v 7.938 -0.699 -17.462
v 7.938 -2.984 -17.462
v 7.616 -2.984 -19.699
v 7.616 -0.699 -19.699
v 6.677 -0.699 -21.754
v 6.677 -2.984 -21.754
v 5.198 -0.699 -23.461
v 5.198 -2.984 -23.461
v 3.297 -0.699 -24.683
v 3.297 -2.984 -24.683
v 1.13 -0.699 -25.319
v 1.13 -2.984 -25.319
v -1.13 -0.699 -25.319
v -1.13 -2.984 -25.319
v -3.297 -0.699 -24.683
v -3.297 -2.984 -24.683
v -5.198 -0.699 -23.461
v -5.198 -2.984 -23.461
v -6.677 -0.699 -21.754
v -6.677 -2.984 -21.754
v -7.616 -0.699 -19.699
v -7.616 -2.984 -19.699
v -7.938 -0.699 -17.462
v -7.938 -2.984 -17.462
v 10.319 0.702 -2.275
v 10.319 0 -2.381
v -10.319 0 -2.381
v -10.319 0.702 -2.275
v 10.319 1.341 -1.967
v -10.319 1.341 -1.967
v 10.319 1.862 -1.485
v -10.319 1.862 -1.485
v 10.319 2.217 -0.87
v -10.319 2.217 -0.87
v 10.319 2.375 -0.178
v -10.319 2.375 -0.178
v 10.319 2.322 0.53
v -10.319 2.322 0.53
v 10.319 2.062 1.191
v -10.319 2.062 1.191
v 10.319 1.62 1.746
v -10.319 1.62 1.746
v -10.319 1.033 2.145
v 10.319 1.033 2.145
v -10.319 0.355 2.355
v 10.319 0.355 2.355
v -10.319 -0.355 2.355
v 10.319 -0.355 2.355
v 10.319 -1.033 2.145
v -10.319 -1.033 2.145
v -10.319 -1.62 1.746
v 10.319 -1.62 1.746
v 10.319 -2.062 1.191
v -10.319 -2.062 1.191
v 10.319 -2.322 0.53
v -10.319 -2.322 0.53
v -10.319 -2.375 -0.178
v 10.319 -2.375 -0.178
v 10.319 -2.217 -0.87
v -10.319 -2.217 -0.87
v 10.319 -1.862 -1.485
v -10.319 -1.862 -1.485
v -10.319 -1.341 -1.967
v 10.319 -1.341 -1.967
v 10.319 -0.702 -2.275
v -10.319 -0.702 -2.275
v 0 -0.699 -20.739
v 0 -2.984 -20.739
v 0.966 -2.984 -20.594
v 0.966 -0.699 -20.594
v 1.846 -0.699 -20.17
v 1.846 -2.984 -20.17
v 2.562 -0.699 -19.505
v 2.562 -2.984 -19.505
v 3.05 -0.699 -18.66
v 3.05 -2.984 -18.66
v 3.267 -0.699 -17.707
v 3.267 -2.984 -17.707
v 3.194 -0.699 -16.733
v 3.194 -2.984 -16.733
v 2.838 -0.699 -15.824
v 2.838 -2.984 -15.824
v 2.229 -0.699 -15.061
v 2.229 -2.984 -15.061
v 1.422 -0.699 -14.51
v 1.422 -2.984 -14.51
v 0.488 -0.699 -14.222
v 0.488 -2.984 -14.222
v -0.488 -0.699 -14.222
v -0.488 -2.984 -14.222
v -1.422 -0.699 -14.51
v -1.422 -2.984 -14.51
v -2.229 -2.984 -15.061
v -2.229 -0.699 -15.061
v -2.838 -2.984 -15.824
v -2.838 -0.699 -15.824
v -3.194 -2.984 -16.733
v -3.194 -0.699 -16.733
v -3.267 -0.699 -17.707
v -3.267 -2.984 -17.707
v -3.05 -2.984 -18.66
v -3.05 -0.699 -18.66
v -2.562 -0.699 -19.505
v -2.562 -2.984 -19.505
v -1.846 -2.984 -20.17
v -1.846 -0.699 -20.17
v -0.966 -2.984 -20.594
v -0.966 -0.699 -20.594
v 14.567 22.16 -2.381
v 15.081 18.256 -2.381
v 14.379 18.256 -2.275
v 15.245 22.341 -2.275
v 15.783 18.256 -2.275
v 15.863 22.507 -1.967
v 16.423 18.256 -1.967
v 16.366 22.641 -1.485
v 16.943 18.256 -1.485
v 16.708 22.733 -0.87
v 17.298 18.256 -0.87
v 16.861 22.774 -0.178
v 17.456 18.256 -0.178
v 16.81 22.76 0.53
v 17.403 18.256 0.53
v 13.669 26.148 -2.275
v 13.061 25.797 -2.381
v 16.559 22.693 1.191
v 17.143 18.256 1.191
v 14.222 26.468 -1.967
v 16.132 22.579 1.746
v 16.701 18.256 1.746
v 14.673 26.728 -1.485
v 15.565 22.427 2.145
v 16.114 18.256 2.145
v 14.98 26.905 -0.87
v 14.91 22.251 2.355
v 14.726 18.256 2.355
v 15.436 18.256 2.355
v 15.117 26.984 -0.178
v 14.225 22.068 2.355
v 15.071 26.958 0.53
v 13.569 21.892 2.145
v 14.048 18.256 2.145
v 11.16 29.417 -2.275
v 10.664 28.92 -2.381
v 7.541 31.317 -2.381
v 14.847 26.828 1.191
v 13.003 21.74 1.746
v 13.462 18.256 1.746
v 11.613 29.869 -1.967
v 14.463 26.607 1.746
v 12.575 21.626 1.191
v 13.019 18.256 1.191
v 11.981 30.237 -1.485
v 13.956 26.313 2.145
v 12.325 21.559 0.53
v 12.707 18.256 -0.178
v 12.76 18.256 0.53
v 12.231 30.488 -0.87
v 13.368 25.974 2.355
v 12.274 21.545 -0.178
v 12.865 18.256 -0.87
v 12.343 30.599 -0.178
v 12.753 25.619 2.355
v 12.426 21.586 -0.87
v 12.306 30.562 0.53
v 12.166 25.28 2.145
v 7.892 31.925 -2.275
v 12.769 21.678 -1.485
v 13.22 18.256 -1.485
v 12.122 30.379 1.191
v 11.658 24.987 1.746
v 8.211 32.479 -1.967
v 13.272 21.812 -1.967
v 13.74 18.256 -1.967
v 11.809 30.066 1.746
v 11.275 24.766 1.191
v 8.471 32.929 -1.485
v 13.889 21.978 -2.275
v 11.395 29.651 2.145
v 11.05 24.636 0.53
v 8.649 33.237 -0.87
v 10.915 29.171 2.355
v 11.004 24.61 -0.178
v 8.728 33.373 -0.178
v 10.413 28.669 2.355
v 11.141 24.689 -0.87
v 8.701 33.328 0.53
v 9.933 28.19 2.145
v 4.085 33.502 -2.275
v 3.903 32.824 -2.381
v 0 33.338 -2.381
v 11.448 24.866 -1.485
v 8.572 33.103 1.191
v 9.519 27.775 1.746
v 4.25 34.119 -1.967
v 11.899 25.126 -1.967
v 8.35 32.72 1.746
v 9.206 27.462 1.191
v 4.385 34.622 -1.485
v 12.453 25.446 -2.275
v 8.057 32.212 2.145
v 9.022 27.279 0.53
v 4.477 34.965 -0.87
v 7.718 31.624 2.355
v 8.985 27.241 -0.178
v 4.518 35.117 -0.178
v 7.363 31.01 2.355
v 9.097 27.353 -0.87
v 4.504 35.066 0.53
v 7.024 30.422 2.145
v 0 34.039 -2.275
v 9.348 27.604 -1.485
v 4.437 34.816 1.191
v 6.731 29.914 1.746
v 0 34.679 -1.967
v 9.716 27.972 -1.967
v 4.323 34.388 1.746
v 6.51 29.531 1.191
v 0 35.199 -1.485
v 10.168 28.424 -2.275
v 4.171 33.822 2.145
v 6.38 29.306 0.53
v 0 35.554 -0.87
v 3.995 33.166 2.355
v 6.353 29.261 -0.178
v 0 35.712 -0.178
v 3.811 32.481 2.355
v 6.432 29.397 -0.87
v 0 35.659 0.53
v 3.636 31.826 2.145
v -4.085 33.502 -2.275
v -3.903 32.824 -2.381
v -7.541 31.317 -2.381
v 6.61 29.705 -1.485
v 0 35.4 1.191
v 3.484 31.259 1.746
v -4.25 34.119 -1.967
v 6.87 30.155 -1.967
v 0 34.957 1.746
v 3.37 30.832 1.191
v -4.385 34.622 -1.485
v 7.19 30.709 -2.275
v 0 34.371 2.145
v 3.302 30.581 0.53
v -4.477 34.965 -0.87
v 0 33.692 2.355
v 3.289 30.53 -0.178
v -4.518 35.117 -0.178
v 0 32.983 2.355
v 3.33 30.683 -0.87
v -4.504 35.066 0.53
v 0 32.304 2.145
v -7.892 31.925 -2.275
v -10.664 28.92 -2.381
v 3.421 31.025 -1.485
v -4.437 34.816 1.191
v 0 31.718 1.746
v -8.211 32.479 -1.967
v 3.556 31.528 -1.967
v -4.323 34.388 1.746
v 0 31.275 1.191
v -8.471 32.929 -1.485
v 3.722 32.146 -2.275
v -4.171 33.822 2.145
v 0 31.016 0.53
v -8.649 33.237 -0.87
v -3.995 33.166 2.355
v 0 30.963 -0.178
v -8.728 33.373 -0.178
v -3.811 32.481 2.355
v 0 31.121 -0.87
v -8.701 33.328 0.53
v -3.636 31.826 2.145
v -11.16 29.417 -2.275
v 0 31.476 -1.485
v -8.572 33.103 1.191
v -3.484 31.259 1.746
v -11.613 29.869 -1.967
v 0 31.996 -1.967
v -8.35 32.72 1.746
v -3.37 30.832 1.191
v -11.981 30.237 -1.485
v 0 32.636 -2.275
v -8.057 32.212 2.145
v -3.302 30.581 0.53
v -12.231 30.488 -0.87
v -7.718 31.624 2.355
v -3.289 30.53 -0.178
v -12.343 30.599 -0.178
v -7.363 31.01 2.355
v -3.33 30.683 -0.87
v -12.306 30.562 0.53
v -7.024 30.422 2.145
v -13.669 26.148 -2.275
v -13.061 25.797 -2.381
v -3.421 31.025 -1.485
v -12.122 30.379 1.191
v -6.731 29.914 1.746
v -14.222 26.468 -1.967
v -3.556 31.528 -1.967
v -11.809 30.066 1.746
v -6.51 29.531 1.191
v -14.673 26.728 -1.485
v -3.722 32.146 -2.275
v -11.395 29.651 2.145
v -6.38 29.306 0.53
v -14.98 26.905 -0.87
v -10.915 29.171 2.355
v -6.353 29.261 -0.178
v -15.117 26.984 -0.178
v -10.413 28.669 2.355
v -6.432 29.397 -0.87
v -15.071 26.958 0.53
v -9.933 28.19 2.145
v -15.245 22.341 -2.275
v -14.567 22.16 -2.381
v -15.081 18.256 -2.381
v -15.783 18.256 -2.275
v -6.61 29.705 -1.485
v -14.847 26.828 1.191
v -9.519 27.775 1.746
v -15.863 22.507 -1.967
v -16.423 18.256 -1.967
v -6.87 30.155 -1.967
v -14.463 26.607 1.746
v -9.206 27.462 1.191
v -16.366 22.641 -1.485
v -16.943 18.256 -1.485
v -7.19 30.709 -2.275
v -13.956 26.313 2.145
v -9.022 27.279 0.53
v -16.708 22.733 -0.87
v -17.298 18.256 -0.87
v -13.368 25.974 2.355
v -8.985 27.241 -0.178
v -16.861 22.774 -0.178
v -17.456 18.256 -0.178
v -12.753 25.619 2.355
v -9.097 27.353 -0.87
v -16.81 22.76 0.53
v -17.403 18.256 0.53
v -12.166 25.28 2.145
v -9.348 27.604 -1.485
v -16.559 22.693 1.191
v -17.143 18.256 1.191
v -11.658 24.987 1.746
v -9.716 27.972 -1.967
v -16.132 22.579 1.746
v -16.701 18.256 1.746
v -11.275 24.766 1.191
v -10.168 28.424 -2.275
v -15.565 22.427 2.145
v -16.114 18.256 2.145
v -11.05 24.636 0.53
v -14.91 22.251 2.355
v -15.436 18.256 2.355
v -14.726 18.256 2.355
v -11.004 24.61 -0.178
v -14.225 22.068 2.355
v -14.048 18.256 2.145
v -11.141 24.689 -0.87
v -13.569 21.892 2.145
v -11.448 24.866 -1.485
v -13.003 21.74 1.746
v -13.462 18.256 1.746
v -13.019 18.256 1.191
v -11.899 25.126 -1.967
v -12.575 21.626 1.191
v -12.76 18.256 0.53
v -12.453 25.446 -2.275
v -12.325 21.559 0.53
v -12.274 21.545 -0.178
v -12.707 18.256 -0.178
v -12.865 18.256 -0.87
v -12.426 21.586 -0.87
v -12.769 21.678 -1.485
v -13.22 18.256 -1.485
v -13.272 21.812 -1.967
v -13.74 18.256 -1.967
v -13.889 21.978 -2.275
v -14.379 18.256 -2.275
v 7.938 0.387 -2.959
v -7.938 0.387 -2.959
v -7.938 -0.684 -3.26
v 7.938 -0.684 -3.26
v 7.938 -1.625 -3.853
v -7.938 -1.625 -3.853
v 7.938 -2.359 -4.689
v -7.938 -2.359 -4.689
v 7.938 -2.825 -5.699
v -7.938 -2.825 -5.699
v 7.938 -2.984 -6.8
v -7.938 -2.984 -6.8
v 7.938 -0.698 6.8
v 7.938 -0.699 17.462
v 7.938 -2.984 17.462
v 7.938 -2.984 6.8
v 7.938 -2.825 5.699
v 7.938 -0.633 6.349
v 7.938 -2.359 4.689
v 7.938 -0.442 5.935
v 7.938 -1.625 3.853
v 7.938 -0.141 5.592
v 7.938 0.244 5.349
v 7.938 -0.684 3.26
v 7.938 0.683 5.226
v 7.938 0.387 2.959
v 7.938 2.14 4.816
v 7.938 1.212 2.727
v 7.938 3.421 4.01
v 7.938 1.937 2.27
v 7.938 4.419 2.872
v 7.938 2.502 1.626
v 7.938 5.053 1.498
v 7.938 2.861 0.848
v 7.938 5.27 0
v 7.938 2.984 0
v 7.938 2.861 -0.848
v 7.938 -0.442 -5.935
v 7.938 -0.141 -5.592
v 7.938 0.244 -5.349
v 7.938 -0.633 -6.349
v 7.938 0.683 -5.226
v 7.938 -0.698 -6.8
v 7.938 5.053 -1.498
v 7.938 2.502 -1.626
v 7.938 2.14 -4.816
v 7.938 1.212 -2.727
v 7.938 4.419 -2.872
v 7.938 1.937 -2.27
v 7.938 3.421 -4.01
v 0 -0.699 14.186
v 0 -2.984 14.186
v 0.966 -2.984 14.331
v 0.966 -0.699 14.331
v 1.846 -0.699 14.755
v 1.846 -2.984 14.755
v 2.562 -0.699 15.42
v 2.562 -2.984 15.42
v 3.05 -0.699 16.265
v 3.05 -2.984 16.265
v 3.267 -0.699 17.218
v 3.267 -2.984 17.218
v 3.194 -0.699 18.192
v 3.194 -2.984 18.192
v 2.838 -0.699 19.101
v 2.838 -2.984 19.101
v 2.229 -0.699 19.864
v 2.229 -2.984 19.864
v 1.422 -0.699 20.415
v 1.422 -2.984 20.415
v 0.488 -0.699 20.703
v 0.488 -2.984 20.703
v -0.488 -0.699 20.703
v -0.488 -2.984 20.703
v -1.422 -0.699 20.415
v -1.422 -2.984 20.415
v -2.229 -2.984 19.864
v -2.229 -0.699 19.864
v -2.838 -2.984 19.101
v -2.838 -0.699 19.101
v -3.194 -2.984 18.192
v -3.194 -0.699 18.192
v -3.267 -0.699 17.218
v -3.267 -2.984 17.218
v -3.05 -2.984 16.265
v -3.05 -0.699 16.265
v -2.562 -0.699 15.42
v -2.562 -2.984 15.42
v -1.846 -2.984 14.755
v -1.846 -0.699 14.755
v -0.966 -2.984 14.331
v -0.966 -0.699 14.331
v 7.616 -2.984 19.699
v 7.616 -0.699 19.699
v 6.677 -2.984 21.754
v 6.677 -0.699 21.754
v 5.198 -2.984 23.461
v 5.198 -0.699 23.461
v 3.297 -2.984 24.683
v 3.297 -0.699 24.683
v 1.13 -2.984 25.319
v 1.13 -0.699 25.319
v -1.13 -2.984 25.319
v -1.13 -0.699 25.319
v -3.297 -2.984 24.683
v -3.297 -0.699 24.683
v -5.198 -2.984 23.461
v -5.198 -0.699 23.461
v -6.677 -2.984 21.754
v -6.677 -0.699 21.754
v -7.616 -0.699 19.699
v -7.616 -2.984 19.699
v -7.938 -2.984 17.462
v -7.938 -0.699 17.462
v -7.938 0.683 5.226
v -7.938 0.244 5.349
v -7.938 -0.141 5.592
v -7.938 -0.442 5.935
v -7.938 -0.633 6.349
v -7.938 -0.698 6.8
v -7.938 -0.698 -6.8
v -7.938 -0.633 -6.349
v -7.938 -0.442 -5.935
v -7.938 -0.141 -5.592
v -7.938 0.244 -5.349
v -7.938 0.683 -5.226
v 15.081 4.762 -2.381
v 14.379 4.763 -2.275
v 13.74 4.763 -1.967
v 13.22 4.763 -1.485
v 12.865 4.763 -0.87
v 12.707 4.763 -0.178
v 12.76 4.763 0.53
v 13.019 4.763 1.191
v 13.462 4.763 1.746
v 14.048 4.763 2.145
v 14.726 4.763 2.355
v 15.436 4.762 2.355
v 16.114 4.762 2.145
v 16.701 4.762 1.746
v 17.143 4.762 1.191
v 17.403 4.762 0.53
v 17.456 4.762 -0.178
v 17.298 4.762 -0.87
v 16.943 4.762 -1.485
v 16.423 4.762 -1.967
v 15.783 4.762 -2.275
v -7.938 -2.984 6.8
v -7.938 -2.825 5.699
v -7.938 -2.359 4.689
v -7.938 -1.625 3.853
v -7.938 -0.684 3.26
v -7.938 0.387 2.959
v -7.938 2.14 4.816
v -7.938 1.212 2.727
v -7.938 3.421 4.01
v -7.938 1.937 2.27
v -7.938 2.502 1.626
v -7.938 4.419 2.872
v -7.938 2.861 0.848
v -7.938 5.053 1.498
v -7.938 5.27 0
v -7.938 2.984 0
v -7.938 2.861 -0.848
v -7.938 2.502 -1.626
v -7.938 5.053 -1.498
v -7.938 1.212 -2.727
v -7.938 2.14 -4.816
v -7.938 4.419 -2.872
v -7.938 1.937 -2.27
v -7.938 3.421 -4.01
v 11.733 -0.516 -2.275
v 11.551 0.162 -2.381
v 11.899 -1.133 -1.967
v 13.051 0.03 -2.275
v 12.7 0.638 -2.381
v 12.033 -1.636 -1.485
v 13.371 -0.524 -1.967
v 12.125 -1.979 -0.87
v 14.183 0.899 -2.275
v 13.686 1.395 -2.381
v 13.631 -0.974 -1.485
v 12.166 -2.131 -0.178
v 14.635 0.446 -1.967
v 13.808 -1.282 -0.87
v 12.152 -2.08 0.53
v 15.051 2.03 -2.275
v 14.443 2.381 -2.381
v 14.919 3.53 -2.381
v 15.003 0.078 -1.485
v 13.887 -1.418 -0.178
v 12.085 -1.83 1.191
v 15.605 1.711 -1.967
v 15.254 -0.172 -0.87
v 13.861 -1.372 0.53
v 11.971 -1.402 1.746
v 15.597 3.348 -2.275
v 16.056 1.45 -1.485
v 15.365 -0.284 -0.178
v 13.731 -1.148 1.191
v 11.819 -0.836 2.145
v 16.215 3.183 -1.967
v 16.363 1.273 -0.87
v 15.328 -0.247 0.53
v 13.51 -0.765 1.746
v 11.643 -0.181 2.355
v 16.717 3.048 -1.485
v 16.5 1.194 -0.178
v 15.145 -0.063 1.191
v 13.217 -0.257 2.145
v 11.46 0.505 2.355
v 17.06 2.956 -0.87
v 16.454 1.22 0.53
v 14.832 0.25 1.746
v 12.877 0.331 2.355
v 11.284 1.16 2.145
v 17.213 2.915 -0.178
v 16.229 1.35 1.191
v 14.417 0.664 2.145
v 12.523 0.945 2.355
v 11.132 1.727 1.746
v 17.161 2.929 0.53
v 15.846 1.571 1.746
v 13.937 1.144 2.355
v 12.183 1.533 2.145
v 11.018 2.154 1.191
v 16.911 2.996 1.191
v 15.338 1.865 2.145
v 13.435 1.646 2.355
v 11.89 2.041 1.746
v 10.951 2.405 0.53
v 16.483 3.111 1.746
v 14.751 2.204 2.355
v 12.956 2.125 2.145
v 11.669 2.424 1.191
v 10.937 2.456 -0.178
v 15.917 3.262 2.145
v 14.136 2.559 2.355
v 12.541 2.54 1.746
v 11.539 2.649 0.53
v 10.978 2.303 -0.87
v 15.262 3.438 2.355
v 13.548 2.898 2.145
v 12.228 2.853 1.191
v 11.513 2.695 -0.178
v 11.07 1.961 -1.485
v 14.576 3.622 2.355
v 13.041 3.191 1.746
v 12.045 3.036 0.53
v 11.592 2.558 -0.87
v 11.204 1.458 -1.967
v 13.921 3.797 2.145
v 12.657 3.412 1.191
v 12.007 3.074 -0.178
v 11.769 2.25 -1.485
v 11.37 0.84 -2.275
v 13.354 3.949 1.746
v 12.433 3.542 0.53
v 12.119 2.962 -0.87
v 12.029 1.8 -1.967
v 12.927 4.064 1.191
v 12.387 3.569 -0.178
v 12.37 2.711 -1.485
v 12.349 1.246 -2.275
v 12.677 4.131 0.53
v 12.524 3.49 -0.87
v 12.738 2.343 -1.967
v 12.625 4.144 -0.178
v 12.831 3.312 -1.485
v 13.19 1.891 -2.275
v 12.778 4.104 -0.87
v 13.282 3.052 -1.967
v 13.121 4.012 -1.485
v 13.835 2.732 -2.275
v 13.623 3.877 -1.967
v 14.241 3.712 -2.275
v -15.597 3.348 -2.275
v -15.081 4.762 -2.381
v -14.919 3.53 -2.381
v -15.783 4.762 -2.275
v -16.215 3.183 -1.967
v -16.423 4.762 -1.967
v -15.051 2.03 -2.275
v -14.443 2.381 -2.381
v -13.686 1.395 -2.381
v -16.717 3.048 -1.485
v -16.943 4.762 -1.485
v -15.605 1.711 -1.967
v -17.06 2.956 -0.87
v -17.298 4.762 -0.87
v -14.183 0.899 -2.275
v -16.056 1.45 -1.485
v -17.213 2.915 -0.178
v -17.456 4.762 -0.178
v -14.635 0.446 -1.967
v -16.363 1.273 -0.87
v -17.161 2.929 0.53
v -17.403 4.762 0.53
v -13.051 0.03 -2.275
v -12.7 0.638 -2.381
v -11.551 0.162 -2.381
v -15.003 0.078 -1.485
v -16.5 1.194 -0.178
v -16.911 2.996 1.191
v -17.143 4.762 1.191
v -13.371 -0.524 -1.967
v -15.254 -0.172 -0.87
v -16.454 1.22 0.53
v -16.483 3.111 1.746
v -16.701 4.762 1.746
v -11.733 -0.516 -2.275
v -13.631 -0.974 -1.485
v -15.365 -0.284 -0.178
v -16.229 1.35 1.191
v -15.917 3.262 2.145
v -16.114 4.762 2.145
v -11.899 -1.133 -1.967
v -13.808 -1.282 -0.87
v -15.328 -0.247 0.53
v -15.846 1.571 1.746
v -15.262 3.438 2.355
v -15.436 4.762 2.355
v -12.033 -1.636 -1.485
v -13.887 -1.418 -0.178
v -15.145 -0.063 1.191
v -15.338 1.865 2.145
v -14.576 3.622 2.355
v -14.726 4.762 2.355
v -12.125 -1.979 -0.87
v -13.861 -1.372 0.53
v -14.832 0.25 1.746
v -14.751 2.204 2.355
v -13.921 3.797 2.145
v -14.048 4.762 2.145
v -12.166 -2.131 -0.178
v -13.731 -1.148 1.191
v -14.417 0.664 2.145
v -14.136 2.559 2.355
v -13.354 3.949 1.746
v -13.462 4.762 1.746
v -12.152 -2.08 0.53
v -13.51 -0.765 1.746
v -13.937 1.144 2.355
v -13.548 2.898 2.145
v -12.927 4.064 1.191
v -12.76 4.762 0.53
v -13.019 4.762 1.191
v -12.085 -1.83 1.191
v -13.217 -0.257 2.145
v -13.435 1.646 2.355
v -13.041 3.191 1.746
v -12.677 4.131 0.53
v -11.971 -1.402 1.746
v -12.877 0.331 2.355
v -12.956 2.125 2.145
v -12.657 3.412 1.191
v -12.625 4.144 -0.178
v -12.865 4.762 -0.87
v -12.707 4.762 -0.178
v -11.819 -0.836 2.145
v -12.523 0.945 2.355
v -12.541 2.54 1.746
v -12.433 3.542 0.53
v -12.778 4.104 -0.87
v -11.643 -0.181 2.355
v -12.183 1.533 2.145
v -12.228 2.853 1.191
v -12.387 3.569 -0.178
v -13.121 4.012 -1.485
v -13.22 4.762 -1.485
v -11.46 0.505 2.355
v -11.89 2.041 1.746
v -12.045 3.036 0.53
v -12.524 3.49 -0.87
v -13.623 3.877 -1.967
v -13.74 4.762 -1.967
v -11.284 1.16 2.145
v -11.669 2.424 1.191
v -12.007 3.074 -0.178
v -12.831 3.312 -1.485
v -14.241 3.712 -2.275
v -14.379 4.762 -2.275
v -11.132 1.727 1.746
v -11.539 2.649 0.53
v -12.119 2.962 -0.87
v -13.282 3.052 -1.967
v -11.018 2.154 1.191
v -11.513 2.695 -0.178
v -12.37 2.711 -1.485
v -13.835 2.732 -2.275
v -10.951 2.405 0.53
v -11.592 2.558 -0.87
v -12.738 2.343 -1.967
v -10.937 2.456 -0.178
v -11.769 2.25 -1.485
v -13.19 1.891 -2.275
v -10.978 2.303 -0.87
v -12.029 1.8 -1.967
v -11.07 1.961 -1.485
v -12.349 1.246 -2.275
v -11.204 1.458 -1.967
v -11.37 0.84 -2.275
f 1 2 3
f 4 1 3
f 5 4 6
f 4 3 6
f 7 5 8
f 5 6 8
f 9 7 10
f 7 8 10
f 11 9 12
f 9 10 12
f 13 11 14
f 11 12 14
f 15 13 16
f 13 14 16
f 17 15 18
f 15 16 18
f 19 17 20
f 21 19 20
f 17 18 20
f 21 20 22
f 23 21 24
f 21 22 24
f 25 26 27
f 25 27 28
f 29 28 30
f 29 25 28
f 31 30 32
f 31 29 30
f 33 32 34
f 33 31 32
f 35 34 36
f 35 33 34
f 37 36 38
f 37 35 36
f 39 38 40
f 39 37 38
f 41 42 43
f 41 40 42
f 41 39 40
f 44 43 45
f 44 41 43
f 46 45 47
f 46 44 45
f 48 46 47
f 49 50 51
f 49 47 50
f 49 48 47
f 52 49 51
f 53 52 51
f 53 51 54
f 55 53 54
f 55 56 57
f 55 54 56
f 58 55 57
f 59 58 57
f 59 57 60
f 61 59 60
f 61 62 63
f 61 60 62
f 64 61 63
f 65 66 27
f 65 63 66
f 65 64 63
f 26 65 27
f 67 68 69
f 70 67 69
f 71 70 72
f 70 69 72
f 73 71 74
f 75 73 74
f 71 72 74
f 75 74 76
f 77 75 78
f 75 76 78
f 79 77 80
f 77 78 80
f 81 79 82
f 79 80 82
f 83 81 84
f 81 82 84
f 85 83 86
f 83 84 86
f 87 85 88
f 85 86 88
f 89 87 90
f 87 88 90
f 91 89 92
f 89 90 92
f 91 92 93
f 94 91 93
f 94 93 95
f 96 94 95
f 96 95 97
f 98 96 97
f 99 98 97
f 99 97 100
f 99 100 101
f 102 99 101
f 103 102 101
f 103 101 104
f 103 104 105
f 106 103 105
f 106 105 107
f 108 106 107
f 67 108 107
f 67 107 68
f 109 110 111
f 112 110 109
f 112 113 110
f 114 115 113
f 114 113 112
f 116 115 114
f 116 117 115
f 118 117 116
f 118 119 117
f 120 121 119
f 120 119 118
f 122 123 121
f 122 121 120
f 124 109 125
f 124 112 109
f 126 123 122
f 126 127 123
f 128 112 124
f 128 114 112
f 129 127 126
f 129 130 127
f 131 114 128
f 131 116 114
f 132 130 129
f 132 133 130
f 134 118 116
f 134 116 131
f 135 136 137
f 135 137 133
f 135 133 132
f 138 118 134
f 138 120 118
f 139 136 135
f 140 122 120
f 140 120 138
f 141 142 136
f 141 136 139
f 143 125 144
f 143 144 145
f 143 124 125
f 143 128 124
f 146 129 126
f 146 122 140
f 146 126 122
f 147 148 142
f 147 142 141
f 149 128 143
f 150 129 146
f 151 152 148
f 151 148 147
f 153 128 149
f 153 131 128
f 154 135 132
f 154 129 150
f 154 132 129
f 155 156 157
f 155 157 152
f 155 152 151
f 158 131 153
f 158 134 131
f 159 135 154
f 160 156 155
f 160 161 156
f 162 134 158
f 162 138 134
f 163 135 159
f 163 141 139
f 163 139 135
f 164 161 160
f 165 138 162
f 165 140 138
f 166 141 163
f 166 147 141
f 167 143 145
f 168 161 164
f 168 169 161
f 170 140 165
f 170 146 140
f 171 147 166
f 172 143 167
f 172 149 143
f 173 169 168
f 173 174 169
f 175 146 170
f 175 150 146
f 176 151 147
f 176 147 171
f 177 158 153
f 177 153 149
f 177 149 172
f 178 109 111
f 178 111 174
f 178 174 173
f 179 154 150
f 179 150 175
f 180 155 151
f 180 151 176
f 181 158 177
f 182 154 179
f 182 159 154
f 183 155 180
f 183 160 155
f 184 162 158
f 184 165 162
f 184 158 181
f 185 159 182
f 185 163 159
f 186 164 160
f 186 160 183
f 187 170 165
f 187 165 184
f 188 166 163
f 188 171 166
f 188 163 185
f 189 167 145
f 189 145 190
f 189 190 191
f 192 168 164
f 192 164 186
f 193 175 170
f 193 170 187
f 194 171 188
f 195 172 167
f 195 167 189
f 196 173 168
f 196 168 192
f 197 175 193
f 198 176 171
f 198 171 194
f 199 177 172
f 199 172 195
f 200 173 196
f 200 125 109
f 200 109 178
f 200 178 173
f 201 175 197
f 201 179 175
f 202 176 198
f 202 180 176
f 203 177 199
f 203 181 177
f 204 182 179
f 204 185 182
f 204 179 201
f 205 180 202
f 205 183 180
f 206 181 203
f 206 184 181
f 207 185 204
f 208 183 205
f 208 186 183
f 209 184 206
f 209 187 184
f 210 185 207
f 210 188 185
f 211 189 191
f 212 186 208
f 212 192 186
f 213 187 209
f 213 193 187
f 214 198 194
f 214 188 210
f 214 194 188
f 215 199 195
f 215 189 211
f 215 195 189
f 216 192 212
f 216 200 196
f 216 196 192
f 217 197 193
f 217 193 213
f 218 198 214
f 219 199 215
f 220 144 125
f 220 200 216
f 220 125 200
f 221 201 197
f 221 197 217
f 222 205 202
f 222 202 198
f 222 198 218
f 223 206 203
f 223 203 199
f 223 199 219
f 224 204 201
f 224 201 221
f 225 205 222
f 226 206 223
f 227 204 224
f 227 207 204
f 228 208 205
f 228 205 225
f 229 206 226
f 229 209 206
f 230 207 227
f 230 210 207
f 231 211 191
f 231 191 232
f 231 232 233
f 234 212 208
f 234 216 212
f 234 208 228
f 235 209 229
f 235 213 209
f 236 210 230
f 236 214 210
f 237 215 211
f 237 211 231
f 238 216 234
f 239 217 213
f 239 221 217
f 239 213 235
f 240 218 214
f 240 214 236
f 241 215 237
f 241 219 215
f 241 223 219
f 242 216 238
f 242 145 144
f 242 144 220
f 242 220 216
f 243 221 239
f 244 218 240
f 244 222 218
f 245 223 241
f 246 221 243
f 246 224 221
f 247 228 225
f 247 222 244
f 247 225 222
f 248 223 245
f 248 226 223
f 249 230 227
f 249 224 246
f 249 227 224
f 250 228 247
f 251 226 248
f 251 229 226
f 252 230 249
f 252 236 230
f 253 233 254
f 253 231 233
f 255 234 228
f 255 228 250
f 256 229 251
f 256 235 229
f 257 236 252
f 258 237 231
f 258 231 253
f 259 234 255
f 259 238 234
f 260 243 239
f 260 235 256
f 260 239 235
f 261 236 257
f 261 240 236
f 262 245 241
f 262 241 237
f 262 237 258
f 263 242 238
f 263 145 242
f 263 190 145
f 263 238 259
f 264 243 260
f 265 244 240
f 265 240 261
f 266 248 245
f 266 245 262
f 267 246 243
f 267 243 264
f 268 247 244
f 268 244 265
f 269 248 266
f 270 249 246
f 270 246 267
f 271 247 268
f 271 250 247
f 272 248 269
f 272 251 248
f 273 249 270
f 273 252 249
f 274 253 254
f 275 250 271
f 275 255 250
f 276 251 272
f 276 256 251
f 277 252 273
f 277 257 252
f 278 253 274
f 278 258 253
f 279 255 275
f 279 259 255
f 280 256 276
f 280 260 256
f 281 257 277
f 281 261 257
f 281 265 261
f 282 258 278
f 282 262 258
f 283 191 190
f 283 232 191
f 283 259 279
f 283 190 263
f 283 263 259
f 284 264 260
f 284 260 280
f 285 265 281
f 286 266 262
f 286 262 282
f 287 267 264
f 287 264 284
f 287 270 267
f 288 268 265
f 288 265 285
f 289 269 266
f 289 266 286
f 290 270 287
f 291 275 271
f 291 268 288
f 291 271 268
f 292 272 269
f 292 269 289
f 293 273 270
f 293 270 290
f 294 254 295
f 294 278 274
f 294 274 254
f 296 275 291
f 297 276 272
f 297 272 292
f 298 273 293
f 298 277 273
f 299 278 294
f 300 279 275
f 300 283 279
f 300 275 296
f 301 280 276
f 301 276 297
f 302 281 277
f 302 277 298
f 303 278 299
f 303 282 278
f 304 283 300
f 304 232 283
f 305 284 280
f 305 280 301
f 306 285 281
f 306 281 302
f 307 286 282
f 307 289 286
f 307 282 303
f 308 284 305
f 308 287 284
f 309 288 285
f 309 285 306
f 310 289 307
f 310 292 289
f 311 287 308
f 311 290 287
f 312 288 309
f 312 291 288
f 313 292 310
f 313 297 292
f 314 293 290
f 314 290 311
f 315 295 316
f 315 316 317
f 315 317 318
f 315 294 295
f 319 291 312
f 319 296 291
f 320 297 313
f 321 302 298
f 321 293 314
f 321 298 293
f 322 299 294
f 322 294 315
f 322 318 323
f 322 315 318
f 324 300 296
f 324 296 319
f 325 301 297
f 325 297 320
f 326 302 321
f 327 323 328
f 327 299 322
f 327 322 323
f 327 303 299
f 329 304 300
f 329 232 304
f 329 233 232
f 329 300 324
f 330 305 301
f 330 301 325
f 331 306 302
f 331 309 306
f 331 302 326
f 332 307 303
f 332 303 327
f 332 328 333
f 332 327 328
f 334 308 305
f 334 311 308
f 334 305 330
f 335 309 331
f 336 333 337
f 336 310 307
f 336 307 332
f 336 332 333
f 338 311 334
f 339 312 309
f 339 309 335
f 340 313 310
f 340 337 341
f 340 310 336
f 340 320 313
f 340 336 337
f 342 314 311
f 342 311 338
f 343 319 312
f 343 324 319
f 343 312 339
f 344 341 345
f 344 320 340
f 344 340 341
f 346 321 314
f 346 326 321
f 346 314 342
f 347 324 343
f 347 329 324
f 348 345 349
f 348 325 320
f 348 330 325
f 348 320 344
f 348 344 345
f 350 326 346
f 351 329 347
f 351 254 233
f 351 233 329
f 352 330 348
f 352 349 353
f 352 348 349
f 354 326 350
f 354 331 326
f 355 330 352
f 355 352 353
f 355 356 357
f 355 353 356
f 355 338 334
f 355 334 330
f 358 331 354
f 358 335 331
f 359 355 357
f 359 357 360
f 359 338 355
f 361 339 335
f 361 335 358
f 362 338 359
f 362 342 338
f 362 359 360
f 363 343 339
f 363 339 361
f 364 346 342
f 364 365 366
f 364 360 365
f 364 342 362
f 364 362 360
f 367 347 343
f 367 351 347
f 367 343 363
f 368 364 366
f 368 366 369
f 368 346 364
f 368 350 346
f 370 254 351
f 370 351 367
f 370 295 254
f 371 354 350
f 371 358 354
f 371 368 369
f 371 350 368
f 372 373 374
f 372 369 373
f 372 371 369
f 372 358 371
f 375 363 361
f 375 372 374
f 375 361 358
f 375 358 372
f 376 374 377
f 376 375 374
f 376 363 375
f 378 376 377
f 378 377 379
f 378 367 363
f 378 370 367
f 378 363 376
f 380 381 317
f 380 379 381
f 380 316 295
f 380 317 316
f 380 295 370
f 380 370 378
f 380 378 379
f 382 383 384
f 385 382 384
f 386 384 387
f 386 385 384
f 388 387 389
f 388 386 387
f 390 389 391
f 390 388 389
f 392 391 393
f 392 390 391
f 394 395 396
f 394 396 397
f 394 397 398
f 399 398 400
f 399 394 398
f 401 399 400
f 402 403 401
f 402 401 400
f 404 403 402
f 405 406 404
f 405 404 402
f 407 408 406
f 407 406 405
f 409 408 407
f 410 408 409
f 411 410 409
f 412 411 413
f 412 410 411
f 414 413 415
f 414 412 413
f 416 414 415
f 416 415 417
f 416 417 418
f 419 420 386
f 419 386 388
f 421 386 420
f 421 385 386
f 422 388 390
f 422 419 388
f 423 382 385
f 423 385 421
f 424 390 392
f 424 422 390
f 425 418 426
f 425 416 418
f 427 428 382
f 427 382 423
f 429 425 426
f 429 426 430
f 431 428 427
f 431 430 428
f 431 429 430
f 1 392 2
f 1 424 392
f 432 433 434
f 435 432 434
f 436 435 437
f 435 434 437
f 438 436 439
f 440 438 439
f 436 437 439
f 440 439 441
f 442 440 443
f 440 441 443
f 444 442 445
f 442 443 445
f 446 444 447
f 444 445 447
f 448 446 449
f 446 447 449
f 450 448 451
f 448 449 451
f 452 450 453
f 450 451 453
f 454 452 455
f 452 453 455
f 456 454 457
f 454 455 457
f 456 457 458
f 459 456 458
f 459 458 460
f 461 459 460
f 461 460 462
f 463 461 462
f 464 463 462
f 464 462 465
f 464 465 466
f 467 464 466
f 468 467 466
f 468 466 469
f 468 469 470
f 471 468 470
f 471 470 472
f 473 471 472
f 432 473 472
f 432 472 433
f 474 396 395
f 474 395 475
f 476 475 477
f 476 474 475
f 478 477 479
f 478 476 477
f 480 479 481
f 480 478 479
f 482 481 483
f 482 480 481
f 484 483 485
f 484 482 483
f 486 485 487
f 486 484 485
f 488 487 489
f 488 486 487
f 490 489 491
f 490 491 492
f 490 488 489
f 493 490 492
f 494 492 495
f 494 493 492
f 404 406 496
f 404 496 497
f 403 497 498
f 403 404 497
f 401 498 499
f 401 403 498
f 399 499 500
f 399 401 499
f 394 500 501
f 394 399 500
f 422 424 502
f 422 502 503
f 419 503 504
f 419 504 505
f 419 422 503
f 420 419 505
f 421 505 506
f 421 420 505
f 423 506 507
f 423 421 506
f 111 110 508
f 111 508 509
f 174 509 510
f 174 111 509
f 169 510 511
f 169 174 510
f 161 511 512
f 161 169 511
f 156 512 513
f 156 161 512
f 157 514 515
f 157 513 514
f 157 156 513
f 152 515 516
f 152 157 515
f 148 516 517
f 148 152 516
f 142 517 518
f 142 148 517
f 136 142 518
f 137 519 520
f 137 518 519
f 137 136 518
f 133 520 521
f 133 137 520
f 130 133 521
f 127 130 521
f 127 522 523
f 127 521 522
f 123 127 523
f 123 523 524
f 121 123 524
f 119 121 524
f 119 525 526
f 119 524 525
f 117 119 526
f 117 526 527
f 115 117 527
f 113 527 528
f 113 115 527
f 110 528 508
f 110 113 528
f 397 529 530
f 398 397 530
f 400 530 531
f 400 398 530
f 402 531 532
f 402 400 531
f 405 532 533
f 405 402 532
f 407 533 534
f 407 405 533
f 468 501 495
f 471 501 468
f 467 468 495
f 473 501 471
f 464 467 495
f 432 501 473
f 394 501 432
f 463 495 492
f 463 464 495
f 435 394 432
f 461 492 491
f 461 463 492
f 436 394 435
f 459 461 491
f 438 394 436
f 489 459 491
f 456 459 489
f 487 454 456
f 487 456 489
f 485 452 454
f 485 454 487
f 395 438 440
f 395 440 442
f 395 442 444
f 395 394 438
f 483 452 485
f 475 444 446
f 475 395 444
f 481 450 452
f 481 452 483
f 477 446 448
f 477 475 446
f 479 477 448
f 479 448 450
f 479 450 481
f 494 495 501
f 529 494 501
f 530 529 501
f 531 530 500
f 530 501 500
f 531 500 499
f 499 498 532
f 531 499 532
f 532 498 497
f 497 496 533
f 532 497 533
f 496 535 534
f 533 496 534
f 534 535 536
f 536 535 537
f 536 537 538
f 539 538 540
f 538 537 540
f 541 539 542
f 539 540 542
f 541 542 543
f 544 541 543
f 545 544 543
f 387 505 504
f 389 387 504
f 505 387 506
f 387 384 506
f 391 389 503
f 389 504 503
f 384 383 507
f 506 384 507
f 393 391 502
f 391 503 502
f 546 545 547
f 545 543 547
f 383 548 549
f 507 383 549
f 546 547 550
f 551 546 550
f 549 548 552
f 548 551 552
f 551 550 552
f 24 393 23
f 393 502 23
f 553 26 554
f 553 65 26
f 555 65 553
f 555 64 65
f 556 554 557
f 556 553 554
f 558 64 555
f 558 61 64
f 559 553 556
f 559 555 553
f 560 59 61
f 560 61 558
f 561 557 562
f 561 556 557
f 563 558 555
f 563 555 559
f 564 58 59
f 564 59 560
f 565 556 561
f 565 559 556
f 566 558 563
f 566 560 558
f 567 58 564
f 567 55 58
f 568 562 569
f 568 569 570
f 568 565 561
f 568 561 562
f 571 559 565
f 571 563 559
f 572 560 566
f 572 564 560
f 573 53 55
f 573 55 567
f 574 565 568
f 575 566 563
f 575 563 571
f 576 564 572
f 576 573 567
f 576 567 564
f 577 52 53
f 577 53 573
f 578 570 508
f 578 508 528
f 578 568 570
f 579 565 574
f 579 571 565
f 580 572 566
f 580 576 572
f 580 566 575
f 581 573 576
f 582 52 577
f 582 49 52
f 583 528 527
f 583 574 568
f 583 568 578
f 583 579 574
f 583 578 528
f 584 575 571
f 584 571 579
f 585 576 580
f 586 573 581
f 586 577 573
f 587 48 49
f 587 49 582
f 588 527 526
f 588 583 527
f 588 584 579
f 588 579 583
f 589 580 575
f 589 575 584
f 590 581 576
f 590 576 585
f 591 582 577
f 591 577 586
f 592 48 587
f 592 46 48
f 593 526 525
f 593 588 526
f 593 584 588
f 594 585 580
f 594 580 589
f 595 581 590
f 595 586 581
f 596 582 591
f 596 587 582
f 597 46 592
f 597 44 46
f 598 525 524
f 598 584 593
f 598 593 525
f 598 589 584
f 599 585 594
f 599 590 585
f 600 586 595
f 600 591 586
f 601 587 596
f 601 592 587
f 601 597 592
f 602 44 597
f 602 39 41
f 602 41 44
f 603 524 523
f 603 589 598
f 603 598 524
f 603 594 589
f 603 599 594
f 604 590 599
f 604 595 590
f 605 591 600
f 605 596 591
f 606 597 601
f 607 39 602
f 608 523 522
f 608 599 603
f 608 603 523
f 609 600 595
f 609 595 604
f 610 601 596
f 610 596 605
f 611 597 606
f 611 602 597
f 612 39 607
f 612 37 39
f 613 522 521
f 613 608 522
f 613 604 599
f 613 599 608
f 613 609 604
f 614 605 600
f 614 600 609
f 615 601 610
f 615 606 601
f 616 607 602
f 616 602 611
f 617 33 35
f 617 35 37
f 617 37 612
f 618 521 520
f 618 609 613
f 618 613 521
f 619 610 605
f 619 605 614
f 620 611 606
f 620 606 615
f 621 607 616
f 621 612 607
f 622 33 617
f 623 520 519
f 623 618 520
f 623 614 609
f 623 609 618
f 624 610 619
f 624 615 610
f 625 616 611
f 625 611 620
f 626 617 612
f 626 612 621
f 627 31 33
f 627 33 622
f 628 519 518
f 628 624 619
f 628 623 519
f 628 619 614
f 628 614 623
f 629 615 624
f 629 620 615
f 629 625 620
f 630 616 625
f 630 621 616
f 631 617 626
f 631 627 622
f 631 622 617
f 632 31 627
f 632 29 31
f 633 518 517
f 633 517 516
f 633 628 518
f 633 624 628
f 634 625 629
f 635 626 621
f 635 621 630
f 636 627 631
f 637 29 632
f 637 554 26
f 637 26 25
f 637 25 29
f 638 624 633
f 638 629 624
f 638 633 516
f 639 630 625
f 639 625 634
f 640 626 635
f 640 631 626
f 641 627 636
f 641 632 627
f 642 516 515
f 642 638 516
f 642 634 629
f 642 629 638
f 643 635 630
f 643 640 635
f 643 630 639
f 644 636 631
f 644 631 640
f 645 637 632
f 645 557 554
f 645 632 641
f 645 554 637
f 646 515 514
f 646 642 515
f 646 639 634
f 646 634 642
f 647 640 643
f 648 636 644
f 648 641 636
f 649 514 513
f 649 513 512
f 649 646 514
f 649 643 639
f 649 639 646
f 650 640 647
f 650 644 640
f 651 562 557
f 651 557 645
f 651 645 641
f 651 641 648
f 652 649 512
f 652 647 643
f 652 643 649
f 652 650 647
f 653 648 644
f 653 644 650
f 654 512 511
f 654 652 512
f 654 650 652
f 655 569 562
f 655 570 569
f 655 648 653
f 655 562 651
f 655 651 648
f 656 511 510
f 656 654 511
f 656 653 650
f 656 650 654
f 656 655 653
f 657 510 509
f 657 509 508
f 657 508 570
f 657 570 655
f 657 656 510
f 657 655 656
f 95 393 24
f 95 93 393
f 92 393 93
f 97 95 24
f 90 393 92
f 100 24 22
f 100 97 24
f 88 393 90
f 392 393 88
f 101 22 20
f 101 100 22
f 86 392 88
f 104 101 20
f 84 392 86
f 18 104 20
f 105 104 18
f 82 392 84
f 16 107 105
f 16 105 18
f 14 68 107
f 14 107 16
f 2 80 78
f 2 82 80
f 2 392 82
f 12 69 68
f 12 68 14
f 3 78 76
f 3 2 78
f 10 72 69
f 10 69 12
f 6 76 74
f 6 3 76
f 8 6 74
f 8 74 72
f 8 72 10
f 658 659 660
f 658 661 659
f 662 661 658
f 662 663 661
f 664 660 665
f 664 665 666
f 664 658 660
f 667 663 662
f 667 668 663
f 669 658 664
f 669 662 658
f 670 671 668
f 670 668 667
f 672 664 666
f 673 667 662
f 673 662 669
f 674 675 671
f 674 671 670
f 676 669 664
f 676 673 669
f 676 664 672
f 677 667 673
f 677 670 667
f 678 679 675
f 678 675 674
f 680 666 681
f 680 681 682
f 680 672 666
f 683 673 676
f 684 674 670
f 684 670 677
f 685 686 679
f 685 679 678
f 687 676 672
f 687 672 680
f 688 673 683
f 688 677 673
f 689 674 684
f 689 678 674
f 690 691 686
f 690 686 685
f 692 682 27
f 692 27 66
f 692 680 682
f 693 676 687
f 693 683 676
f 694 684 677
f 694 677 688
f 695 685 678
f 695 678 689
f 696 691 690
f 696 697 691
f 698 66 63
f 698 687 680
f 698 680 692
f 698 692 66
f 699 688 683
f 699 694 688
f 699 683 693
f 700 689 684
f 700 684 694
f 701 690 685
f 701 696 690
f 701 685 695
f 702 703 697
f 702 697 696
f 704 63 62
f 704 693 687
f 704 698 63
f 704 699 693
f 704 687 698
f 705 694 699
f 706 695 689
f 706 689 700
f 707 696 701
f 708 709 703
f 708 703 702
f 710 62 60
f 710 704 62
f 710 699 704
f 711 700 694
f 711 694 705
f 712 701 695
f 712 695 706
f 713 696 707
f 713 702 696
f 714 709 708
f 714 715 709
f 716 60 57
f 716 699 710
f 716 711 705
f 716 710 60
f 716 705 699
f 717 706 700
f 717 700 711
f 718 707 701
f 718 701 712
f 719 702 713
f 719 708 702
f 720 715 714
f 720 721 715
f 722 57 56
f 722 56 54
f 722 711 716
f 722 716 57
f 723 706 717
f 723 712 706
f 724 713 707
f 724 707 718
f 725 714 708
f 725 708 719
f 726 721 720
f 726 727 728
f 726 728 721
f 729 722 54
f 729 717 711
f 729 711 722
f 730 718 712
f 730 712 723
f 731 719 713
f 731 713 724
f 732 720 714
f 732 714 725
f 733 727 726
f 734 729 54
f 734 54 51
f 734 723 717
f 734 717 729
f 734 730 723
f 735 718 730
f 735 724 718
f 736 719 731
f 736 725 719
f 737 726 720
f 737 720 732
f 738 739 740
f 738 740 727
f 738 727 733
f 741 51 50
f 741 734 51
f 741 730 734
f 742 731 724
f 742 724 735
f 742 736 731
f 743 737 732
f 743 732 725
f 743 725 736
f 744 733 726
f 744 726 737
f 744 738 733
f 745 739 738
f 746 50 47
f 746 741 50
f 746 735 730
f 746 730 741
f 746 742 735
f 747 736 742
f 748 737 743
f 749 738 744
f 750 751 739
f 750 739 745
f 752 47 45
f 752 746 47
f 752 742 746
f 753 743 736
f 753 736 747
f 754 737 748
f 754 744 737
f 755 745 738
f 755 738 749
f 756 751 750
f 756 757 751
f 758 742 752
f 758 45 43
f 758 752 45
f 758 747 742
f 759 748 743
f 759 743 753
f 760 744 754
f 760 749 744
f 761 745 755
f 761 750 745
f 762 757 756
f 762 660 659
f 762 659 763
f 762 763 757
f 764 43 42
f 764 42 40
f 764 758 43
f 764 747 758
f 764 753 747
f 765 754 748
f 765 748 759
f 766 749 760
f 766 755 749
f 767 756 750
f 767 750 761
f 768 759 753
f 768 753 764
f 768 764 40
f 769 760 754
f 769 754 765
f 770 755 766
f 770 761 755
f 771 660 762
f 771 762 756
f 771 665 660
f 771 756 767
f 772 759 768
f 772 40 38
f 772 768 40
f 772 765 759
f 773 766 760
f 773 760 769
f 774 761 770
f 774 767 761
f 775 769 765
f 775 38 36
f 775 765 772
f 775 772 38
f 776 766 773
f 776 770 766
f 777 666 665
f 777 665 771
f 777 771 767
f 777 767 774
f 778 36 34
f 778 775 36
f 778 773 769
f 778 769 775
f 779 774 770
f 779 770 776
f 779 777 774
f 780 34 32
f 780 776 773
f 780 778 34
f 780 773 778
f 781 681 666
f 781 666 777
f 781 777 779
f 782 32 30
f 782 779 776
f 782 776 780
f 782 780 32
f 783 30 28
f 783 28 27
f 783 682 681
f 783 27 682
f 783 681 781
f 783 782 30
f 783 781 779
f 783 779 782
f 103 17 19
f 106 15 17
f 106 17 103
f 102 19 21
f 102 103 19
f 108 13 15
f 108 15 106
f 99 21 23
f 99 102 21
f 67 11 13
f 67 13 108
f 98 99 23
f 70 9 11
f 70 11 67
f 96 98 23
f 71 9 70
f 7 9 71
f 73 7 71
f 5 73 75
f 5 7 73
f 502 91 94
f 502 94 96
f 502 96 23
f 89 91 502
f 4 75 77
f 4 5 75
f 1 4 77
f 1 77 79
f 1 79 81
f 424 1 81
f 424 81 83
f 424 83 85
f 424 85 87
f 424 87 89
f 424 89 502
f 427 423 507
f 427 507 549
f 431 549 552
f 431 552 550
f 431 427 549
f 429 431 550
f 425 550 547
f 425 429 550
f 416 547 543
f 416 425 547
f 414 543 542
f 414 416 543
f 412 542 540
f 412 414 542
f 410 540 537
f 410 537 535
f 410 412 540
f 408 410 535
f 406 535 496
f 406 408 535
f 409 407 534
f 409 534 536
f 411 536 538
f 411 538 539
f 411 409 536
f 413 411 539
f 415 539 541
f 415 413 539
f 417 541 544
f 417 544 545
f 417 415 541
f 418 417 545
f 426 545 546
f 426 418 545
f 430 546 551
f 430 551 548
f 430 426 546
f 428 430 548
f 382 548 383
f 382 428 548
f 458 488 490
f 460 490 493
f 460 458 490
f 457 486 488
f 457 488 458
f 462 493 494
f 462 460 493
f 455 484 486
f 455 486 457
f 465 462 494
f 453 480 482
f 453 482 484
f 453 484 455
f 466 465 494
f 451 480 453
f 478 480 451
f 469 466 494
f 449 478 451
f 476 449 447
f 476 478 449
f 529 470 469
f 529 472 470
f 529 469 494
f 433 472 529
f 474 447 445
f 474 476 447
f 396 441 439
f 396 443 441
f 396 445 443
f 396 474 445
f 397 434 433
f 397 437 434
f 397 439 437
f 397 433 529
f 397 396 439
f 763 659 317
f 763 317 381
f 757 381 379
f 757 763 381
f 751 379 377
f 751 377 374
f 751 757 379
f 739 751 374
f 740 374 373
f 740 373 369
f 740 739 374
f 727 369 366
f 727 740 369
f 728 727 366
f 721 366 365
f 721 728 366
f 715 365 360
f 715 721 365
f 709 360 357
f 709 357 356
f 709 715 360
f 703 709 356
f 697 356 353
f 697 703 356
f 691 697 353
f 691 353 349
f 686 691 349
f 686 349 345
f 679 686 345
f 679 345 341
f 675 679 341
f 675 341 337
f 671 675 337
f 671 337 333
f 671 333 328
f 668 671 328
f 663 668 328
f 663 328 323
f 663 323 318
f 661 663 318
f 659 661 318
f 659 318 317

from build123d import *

# Parameters (mm, degrees)
SKETCH2_R           = 2.38125
BOSS_EXTRUDE1_DEPTH = 7.9375
SKETCH4_R           = 3.2766
CUT_EXTRUDE1_DEPTH  = 50.477676563


with BuildPart() as part:
    # Sweep1: sweep along a path in Sketch1
    with BuildLine(Plane.XY) as sweep1_path:
        Line((-15.08125, 18.25625), (-15.08125, 4.7625))
        ThreePointArc((-15.08125, 4.7625), (-13.686346045, 1.394903955), (-10.31875, 0))
        Line((-10.31875, 0), (10.31875, 0))
        ThreePointArc((10.31875, 0), (13.686346045, 1.394903955), (15.08125, 4.7625))
        Line((15.08125, 4.7625), (15.08125, 18.25625))
        ThreePointArc((15.08125, 18.25625), (0, 33.3375), (-15.08125, 18.25625))
    # Sketch2 → Sweep1 (sweep)
    with BuildSketch(Plane(origin=(0, 0, 0), x_dir=(0, 0, -1), z_dir=(1, 0, 0))):
        Circle(SKETCH2_R)
    sweep(path=sweep1_path.line)


with BuildPart() as body_2:
    # Sketch3 → Boss-Extrude1 (new, symmetric)
    with BuildSketch(Plane(origin=(0, 0, 0), x_dir=(0, 0, -1), z_dir=(1, 0, 0))):
        with BuildLine():
            Line((-25.4, -2.9845), (-6.800135513, -2.9845))
            ThreePointArc((-6.800135513, -2.9845), (-4.244843065, -2.022096486), (-2.959318233, 0.38687963))
            ThreePointArc((-2.959318233, 0.38687963), (0, 2.9845), (2.959318233, 0.38687963))
            ThreePointArc((2.959318233, 0.38687963), (4.244843065, -2.022096486), (6.800135513, -2.9845))
            Line((6.800135513, -2.9845), (25.4, -2.9845))
            Line((25.4, -2.9845), (25.4, -0.6985))
            Line((25.4, -0.6985), (6.800135513, -0.6985))
            ThreePointArc((6.800135513, -0.6985), (5.75288451, -0.30407233), (5.22603007, 0.683212963))
            ThreePointArc((5.22603007, 0.683212963), (0, 5.2705), (-5.22603007, 0.683212963))
            ThreePointArc((-5.22603007, 0.683212963), (-5.75288451, -0.30407233), (-6.800135513, -0.6985))
            Line((-6.800135513, -0.6985), (-25.4, -0.6985))
            Line((-25.4, -0.6985), (-25.4, -2.9845))
        make_face()
    extrude(amount=BOSS_EXTRUDE1_DEPTH, both=True)

    # Sketch4 → Cut-Extrude1 (cut, through all)
    with BuildSketch(Plane.XZ.offset(2.9845)):
        with Locations(Location((0, 17.4625, 0), (0, 0, 270))):
            Circle(SKETCH4_R)
        with Locations(Location((0, -17.4625, 0), (0, 0, 270))):
            Circle(SKETCH4_R)
        with BuildLine():
            Line((-7.9375, 17.4625), (-7.9375, 25.4))
            Line((-7.9375, 25.4), (-7.9375, 26.67))
            Line((-7.9375, 26.67), (7.9375, 26.67))
            Line((7.9375, 26.67), (7.9375, 25.4))
            Line((7.9375, 25.4), (7.9375, 17.4625))
            ThreePointArc((7.9375, 17.4625), (0, 25.4), (-7.9375, 17.4625))
        make_face()
        with BuildLine():
            Line((7.9375, -25.4), (7.9375, -17.4625))
            ThreePointArc((7.9375, -17.4625), (0, -25.4), (-7.9375, -17.4625))
            Line((-7.9375, -17.4625), (-7.9375, -25.4))
            Line((-7.9375, -25.4), (-7.9375, -26.67))
            Line((-7.9375, -26.67), (7.9375, -26.67))
            Line((7.9375, -26.67), (7.9375, -25.4))
        make_face()
    extrude(amount=-CUT_EXTRUDE1_DEPTH, mode=Mode.SUBTRACT)


solid = Compound([part.part, body_2.part])
